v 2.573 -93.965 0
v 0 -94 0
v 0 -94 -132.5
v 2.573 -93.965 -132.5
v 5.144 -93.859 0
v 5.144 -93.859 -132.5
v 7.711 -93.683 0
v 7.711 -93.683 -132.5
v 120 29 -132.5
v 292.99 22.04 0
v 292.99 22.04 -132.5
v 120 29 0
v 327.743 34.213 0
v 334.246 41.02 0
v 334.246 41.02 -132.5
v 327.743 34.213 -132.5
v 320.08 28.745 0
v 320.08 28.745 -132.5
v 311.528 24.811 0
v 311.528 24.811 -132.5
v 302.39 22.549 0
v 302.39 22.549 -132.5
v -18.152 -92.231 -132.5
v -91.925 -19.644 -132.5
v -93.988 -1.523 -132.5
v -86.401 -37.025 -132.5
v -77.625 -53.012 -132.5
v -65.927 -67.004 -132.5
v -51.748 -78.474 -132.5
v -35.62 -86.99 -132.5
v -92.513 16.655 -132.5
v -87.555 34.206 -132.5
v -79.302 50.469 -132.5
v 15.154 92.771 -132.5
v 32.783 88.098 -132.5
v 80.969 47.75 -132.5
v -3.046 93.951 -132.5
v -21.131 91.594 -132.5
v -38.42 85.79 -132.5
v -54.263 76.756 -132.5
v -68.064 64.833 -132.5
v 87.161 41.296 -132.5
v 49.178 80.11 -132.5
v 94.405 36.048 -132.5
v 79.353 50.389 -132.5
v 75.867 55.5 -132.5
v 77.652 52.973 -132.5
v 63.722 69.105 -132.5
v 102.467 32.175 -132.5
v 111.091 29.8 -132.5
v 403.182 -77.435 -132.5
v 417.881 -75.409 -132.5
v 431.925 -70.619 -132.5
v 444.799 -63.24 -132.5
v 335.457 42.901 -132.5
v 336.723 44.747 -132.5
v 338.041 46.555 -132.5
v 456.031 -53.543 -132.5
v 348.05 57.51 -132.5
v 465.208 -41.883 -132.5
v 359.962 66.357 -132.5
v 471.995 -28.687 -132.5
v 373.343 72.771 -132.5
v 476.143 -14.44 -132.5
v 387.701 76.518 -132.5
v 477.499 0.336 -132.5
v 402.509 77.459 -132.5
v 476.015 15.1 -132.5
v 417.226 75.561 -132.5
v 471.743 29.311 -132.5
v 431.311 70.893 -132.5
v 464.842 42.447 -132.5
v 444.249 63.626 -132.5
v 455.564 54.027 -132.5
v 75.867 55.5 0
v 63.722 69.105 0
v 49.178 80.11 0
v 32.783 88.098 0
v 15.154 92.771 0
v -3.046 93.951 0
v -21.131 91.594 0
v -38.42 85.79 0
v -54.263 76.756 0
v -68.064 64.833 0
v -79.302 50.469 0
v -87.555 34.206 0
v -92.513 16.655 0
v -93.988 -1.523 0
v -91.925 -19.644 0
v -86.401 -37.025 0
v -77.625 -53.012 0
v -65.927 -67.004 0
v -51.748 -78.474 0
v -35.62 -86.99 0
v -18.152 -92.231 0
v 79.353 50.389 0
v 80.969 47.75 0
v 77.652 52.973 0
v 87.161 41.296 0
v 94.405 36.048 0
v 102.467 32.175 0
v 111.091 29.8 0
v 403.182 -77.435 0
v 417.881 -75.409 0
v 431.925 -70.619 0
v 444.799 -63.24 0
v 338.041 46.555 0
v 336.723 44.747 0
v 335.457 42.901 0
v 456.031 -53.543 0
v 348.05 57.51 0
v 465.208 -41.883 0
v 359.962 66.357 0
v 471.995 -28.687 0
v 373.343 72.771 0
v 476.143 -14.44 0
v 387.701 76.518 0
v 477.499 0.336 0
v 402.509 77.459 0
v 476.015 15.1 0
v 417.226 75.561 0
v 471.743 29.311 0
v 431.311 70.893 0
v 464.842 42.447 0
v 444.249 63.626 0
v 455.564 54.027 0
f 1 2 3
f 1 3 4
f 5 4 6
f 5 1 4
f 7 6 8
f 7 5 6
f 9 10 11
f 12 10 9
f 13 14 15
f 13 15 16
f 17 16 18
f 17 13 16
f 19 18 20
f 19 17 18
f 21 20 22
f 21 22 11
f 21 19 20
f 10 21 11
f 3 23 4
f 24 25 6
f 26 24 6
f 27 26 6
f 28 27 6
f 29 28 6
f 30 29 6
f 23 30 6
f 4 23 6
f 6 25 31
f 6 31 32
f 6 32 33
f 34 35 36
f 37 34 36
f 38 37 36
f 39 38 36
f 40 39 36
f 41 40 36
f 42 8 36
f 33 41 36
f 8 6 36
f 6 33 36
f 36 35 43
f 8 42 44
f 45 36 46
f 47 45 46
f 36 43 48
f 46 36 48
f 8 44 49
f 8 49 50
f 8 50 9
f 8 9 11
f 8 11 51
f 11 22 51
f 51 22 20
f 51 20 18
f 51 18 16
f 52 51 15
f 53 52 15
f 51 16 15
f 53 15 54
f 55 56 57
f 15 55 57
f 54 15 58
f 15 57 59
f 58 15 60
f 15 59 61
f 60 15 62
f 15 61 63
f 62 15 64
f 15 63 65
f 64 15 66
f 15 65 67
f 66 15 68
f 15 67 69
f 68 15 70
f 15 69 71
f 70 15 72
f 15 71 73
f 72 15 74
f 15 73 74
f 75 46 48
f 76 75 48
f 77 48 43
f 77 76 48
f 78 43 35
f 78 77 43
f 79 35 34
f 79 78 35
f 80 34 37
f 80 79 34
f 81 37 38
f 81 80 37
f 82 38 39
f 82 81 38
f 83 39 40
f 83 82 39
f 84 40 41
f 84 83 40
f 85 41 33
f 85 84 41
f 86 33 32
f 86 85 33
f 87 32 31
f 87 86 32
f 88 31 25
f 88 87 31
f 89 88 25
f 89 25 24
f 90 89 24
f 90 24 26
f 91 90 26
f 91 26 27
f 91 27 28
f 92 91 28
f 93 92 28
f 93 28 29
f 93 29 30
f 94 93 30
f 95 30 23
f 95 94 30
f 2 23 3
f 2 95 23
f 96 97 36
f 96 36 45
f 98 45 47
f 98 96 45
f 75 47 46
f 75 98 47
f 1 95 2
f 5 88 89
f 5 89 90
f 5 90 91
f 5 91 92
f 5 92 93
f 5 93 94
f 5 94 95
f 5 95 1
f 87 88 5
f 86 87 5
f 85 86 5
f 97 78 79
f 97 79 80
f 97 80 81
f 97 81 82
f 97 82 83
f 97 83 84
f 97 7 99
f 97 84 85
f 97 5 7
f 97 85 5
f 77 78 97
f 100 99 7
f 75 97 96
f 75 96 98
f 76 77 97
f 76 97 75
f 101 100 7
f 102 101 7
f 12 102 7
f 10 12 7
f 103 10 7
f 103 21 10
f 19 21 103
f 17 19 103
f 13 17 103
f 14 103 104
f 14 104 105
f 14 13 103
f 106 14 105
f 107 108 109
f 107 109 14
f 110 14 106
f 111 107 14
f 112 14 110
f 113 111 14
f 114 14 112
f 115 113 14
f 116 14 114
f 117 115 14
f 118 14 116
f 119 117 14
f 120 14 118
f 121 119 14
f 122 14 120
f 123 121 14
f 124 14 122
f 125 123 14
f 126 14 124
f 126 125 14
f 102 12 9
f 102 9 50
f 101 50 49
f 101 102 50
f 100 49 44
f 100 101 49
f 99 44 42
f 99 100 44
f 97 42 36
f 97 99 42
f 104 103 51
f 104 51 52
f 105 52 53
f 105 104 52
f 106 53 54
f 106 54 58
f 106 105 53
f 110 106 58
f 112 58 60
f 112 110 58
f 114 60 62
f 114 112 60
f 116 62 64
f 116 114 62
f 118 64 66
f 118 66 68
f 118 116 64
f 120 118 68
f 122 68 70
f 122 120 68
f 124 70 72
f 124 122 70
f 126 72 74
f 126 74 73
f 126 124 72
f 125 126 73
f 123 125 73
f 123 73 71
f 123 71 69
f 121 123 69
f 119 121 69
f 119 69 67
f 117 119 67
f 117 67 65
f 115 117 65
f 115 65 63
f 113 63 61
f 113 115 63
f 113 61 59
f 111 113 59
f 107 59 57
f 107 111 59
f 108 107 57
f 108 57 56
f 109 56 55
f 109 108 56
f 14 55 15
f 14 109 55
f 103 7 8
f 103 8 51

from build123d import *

# Parameters (mm, degrees)
F1_DEPTH = 132.5


with BuildPart() as f1:
    # F0 (on Top) → F1 (new body)
    with BuildSketch(Plane.XY):
        with BuildLine():
            ThreePointArc((75.866733, 55.4999), (78.237558, 51.506392), (80.968692, 47.750088))
            ThreePointArc((80.968692, 47.750088), (78.513391, 51.687982), (75.866733, 55.4999))
        make_face()
        with BuildLine():
            ThreePointArc((120, 29), (98.349314, 33.930633), (80.968692, 47.750088))
            ThreePointArc((80.968692, 47.750088), (78.237558, 51.506392), (75.866733, 55.4999))
            ThreePointArc((75.866733, 55.4999), (-83.824193, 42.538273), (0, -94))
            Line((0, -94), (7.711251, -93.683171))
            Line((7.711251, -93.683171), (403.181522, -77.434669))
            ThreePointArc((403.181522, -77.434669), (468.607926, 36.044451), (338.04126, 46.554963))
            ThreePointArc((338.04126, 46.554963), (336.236443, 43.723582), (334.245664, 41.019718))
            ThreePointArc((334.245664, 41.019718), (315.896852, 26.576201), (292.99007, 22.040415))
            Line((292.99007, 22.040415), (120, 29))
        make_face()
        with BuildLine():
            Line((7.711251, -93.683171), (0, -94))
            ThreePointArc((0, -94), (3.858878, -93.920759), (7.711251, -93.683171))
        make_face()
        with BuildLine():
            ThreePointArc((338.04126, 46.554963), (336.083514, 43.828448), (334.245664, 41.019718))
            ThreePointArc((334.245664, 41.019718), (336.236443, 43.723582), (338.04126, 46.554963))
        make_face()
    extrude(amount=-F1_DEPTH)


solid = f1.part
